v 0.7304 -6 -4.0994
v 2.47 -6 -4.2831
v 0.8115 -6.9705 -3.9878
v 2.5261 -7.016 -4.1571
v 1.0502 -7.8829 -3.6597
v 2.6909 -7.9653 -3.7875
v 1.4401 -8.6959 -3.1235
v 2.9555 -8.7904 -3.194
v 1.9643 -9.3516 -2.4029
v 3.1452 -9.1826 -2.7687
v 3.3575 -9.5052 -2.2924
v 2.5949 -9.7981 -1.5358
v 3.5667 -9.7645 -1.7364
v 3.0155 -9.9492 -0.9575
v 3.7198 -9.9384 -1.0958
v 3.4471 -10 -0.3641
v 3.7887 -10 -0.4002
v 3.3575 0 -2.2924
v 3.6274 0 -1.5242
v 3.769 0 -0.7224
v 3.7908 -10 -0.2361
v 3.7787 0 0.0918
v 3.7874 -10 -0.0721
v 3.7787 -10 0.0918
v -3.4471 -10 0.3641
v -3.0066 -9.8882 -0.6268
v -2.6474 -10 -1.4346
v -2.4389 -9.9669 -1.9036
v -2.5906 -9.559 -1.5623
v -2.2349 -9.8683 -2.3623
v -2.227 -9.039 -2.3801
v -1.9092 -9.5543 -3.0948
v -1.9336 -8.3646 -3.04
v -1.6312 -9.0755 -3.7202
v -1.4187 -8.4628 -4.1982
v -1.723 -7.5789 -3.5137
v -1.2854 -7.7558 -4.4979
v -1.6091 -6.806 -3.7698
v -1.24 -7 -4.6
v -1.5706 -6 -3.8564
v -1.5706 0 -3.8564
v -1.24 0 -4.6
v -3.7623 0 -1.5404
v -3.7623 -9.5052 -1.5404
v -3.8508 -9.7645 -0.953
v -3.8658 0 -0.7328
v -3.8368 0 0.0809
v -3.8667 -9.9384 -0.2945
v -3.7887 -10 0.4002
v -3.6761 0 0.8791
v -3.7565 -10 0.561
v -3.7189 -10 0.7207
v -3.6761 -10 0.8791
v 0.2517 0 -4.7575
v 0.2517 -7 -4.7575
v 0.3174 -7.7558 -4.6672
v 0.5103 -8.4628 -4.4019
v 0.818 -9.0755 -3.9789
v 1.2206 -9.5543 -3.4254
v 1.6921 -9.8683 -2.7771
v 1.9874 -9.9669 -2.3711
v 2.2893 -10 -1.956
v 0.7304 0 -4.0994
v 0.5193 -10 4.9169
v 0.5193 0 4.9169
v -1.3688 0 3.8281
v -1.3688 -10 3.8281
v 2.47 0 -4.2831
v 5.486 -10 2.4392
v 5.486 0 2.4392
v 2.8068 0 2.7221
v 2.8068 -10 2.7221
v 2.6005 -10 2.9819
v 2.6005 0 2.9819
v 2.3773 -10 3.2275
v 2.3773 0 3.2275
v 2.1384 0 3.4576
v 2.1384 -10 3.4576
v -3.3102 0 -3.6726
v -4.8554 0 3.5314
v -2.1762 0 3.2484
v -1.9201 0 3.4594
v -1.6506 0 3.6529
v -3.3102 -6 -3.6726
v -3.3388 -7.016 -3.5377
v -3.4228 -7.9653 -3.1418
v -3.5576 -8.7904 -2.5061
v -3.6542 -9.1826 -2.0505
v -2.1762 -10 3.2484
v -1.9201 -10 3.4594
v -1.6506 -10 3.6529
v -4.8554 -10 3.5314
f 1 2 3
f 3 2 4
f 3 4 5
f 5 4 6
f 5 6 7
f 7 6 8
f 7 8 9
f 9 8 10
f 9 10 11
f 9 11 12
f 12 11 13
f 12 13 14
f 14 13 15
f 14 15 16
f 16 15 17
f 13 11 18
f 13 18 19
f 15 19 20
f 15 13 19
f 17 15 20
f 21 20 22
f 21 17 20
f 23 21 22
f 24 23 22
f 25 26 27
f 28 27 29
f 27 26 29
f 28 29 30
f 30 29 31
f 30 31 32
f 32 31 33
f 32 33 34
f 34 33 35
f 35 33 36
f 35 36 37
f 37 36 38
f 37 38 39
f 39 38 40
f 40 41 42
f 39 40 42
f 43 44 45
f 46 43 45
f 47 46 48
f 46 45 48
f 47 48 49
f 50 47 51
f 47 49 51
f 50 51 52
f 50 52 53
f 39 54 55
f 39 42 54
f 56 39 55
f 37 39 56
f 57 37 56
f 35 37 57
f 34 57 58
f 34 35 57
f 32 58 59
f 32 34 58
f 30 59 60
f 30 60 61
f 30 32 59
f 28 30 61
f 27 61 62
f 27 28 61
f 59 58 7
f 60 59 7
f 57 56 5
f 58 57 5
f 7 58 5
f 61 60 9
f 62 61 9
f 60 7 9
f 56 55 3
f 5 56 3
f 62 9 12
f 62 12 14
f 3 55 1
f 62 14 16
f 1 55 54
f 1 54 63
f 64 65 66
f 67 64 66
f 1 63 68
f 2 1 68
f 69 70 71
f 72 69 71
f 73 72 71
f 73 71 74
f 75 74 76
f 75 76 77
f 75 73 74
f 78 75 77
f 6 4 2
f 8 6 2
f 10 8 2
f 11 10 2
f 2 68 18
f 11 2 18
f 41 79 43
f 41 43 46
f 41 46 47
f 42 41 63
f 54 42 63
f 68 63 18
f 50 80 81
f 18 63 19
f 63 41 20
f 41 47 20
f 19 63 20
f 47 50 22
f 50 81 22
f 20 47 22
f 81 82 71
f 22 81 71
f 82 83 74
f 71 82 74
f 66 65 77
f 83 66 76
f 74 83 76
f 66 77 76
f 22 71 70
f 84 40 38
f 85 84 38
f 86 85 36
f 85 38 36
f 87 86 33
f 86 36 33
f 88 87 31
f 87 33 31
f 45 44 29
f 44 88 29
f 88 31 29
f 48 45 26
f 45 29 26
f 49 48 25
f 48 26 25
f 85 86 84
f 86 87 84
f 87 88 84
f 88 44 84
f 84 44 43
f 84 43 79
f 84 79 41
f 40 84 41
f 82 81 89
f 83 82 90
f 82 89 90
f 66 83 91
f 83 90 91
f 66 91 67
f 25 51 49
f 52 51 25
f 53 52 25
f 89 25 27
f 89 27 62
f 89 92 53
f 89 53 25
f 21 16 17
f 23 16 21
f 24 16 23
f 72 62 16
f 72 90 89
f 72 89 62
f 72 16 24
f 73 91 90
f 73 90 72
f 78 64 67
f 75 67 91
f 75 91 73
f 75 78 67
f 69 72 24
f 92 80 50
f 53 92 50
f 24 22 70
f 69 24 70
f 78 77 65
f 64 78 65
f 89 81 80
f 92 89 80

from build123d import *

# Parameters (mm, degrees)
F1_DEPTH = 10
F2_R     = 4
F3_R     = 5
F4_R     = 5
F6_DEPTH = 10
F7_SIZE  = 1.5
F8_R     = 3


with BuildPart() as f1:
    # F0 (on Front) → F1 (new body)
    with BuildSketch(Plane.XZ):
        Polygon((4.8367500103, 1.0255116078), (0.5193184536, 4.9169231297), (-4.515793555, 2.0133140065), (-3.3102323568, -3.6726266437), (2.4699574478, -4.2831221003), align=None)
    extrude(amount=F1_DEPTH)

    # F2
    f2_edges = [f1.edges().sort_by_distance(p)[0] for p in [
        (-0.420137, -10, -3.977874),
    ]]
    fillet(f2_edges, radius=F2_R)

    # F3
    f3_edges = [f1.edges().sort_by_distance(p)[0] for p in [
        (4.83675, -5, 1.025512),
    ]]
    fillet(f3_edges, radius=F3_R)

    # F4
    f4_edges = [f1.edges().sort_by_distance(p)[0] for p in [
        (-4.515794, -5, 2.013314),
    ]]
    fillet(f4_edges, radius=F4_R)

    # F5 (on Front) → F6 (join)
    with BuildSketch(Plane.XZ):
        Polygon((5.4859916503, 2.4391776778), (-4.8553856584, 3.5314192952), (-0.6306059919, -5.970596973), align=None)
    extrude(amount=F6_DEPTH)

    # F7
    f7_edges = [f1.edges().sort_by_distance(p)[0] for p in [
        (-0.630606, -5, -5.970597),
    ]]
    chamfer(f7_edges, length=F7_SIZE)

    # F8
    f8_edges = [f1.edges().sort_by_distance(p)[0] for p in [
        (-0.494162, -10, -4.678744),
    ]]
    fillet(f8_edges, radius=F8_R)


solid = f1.part
